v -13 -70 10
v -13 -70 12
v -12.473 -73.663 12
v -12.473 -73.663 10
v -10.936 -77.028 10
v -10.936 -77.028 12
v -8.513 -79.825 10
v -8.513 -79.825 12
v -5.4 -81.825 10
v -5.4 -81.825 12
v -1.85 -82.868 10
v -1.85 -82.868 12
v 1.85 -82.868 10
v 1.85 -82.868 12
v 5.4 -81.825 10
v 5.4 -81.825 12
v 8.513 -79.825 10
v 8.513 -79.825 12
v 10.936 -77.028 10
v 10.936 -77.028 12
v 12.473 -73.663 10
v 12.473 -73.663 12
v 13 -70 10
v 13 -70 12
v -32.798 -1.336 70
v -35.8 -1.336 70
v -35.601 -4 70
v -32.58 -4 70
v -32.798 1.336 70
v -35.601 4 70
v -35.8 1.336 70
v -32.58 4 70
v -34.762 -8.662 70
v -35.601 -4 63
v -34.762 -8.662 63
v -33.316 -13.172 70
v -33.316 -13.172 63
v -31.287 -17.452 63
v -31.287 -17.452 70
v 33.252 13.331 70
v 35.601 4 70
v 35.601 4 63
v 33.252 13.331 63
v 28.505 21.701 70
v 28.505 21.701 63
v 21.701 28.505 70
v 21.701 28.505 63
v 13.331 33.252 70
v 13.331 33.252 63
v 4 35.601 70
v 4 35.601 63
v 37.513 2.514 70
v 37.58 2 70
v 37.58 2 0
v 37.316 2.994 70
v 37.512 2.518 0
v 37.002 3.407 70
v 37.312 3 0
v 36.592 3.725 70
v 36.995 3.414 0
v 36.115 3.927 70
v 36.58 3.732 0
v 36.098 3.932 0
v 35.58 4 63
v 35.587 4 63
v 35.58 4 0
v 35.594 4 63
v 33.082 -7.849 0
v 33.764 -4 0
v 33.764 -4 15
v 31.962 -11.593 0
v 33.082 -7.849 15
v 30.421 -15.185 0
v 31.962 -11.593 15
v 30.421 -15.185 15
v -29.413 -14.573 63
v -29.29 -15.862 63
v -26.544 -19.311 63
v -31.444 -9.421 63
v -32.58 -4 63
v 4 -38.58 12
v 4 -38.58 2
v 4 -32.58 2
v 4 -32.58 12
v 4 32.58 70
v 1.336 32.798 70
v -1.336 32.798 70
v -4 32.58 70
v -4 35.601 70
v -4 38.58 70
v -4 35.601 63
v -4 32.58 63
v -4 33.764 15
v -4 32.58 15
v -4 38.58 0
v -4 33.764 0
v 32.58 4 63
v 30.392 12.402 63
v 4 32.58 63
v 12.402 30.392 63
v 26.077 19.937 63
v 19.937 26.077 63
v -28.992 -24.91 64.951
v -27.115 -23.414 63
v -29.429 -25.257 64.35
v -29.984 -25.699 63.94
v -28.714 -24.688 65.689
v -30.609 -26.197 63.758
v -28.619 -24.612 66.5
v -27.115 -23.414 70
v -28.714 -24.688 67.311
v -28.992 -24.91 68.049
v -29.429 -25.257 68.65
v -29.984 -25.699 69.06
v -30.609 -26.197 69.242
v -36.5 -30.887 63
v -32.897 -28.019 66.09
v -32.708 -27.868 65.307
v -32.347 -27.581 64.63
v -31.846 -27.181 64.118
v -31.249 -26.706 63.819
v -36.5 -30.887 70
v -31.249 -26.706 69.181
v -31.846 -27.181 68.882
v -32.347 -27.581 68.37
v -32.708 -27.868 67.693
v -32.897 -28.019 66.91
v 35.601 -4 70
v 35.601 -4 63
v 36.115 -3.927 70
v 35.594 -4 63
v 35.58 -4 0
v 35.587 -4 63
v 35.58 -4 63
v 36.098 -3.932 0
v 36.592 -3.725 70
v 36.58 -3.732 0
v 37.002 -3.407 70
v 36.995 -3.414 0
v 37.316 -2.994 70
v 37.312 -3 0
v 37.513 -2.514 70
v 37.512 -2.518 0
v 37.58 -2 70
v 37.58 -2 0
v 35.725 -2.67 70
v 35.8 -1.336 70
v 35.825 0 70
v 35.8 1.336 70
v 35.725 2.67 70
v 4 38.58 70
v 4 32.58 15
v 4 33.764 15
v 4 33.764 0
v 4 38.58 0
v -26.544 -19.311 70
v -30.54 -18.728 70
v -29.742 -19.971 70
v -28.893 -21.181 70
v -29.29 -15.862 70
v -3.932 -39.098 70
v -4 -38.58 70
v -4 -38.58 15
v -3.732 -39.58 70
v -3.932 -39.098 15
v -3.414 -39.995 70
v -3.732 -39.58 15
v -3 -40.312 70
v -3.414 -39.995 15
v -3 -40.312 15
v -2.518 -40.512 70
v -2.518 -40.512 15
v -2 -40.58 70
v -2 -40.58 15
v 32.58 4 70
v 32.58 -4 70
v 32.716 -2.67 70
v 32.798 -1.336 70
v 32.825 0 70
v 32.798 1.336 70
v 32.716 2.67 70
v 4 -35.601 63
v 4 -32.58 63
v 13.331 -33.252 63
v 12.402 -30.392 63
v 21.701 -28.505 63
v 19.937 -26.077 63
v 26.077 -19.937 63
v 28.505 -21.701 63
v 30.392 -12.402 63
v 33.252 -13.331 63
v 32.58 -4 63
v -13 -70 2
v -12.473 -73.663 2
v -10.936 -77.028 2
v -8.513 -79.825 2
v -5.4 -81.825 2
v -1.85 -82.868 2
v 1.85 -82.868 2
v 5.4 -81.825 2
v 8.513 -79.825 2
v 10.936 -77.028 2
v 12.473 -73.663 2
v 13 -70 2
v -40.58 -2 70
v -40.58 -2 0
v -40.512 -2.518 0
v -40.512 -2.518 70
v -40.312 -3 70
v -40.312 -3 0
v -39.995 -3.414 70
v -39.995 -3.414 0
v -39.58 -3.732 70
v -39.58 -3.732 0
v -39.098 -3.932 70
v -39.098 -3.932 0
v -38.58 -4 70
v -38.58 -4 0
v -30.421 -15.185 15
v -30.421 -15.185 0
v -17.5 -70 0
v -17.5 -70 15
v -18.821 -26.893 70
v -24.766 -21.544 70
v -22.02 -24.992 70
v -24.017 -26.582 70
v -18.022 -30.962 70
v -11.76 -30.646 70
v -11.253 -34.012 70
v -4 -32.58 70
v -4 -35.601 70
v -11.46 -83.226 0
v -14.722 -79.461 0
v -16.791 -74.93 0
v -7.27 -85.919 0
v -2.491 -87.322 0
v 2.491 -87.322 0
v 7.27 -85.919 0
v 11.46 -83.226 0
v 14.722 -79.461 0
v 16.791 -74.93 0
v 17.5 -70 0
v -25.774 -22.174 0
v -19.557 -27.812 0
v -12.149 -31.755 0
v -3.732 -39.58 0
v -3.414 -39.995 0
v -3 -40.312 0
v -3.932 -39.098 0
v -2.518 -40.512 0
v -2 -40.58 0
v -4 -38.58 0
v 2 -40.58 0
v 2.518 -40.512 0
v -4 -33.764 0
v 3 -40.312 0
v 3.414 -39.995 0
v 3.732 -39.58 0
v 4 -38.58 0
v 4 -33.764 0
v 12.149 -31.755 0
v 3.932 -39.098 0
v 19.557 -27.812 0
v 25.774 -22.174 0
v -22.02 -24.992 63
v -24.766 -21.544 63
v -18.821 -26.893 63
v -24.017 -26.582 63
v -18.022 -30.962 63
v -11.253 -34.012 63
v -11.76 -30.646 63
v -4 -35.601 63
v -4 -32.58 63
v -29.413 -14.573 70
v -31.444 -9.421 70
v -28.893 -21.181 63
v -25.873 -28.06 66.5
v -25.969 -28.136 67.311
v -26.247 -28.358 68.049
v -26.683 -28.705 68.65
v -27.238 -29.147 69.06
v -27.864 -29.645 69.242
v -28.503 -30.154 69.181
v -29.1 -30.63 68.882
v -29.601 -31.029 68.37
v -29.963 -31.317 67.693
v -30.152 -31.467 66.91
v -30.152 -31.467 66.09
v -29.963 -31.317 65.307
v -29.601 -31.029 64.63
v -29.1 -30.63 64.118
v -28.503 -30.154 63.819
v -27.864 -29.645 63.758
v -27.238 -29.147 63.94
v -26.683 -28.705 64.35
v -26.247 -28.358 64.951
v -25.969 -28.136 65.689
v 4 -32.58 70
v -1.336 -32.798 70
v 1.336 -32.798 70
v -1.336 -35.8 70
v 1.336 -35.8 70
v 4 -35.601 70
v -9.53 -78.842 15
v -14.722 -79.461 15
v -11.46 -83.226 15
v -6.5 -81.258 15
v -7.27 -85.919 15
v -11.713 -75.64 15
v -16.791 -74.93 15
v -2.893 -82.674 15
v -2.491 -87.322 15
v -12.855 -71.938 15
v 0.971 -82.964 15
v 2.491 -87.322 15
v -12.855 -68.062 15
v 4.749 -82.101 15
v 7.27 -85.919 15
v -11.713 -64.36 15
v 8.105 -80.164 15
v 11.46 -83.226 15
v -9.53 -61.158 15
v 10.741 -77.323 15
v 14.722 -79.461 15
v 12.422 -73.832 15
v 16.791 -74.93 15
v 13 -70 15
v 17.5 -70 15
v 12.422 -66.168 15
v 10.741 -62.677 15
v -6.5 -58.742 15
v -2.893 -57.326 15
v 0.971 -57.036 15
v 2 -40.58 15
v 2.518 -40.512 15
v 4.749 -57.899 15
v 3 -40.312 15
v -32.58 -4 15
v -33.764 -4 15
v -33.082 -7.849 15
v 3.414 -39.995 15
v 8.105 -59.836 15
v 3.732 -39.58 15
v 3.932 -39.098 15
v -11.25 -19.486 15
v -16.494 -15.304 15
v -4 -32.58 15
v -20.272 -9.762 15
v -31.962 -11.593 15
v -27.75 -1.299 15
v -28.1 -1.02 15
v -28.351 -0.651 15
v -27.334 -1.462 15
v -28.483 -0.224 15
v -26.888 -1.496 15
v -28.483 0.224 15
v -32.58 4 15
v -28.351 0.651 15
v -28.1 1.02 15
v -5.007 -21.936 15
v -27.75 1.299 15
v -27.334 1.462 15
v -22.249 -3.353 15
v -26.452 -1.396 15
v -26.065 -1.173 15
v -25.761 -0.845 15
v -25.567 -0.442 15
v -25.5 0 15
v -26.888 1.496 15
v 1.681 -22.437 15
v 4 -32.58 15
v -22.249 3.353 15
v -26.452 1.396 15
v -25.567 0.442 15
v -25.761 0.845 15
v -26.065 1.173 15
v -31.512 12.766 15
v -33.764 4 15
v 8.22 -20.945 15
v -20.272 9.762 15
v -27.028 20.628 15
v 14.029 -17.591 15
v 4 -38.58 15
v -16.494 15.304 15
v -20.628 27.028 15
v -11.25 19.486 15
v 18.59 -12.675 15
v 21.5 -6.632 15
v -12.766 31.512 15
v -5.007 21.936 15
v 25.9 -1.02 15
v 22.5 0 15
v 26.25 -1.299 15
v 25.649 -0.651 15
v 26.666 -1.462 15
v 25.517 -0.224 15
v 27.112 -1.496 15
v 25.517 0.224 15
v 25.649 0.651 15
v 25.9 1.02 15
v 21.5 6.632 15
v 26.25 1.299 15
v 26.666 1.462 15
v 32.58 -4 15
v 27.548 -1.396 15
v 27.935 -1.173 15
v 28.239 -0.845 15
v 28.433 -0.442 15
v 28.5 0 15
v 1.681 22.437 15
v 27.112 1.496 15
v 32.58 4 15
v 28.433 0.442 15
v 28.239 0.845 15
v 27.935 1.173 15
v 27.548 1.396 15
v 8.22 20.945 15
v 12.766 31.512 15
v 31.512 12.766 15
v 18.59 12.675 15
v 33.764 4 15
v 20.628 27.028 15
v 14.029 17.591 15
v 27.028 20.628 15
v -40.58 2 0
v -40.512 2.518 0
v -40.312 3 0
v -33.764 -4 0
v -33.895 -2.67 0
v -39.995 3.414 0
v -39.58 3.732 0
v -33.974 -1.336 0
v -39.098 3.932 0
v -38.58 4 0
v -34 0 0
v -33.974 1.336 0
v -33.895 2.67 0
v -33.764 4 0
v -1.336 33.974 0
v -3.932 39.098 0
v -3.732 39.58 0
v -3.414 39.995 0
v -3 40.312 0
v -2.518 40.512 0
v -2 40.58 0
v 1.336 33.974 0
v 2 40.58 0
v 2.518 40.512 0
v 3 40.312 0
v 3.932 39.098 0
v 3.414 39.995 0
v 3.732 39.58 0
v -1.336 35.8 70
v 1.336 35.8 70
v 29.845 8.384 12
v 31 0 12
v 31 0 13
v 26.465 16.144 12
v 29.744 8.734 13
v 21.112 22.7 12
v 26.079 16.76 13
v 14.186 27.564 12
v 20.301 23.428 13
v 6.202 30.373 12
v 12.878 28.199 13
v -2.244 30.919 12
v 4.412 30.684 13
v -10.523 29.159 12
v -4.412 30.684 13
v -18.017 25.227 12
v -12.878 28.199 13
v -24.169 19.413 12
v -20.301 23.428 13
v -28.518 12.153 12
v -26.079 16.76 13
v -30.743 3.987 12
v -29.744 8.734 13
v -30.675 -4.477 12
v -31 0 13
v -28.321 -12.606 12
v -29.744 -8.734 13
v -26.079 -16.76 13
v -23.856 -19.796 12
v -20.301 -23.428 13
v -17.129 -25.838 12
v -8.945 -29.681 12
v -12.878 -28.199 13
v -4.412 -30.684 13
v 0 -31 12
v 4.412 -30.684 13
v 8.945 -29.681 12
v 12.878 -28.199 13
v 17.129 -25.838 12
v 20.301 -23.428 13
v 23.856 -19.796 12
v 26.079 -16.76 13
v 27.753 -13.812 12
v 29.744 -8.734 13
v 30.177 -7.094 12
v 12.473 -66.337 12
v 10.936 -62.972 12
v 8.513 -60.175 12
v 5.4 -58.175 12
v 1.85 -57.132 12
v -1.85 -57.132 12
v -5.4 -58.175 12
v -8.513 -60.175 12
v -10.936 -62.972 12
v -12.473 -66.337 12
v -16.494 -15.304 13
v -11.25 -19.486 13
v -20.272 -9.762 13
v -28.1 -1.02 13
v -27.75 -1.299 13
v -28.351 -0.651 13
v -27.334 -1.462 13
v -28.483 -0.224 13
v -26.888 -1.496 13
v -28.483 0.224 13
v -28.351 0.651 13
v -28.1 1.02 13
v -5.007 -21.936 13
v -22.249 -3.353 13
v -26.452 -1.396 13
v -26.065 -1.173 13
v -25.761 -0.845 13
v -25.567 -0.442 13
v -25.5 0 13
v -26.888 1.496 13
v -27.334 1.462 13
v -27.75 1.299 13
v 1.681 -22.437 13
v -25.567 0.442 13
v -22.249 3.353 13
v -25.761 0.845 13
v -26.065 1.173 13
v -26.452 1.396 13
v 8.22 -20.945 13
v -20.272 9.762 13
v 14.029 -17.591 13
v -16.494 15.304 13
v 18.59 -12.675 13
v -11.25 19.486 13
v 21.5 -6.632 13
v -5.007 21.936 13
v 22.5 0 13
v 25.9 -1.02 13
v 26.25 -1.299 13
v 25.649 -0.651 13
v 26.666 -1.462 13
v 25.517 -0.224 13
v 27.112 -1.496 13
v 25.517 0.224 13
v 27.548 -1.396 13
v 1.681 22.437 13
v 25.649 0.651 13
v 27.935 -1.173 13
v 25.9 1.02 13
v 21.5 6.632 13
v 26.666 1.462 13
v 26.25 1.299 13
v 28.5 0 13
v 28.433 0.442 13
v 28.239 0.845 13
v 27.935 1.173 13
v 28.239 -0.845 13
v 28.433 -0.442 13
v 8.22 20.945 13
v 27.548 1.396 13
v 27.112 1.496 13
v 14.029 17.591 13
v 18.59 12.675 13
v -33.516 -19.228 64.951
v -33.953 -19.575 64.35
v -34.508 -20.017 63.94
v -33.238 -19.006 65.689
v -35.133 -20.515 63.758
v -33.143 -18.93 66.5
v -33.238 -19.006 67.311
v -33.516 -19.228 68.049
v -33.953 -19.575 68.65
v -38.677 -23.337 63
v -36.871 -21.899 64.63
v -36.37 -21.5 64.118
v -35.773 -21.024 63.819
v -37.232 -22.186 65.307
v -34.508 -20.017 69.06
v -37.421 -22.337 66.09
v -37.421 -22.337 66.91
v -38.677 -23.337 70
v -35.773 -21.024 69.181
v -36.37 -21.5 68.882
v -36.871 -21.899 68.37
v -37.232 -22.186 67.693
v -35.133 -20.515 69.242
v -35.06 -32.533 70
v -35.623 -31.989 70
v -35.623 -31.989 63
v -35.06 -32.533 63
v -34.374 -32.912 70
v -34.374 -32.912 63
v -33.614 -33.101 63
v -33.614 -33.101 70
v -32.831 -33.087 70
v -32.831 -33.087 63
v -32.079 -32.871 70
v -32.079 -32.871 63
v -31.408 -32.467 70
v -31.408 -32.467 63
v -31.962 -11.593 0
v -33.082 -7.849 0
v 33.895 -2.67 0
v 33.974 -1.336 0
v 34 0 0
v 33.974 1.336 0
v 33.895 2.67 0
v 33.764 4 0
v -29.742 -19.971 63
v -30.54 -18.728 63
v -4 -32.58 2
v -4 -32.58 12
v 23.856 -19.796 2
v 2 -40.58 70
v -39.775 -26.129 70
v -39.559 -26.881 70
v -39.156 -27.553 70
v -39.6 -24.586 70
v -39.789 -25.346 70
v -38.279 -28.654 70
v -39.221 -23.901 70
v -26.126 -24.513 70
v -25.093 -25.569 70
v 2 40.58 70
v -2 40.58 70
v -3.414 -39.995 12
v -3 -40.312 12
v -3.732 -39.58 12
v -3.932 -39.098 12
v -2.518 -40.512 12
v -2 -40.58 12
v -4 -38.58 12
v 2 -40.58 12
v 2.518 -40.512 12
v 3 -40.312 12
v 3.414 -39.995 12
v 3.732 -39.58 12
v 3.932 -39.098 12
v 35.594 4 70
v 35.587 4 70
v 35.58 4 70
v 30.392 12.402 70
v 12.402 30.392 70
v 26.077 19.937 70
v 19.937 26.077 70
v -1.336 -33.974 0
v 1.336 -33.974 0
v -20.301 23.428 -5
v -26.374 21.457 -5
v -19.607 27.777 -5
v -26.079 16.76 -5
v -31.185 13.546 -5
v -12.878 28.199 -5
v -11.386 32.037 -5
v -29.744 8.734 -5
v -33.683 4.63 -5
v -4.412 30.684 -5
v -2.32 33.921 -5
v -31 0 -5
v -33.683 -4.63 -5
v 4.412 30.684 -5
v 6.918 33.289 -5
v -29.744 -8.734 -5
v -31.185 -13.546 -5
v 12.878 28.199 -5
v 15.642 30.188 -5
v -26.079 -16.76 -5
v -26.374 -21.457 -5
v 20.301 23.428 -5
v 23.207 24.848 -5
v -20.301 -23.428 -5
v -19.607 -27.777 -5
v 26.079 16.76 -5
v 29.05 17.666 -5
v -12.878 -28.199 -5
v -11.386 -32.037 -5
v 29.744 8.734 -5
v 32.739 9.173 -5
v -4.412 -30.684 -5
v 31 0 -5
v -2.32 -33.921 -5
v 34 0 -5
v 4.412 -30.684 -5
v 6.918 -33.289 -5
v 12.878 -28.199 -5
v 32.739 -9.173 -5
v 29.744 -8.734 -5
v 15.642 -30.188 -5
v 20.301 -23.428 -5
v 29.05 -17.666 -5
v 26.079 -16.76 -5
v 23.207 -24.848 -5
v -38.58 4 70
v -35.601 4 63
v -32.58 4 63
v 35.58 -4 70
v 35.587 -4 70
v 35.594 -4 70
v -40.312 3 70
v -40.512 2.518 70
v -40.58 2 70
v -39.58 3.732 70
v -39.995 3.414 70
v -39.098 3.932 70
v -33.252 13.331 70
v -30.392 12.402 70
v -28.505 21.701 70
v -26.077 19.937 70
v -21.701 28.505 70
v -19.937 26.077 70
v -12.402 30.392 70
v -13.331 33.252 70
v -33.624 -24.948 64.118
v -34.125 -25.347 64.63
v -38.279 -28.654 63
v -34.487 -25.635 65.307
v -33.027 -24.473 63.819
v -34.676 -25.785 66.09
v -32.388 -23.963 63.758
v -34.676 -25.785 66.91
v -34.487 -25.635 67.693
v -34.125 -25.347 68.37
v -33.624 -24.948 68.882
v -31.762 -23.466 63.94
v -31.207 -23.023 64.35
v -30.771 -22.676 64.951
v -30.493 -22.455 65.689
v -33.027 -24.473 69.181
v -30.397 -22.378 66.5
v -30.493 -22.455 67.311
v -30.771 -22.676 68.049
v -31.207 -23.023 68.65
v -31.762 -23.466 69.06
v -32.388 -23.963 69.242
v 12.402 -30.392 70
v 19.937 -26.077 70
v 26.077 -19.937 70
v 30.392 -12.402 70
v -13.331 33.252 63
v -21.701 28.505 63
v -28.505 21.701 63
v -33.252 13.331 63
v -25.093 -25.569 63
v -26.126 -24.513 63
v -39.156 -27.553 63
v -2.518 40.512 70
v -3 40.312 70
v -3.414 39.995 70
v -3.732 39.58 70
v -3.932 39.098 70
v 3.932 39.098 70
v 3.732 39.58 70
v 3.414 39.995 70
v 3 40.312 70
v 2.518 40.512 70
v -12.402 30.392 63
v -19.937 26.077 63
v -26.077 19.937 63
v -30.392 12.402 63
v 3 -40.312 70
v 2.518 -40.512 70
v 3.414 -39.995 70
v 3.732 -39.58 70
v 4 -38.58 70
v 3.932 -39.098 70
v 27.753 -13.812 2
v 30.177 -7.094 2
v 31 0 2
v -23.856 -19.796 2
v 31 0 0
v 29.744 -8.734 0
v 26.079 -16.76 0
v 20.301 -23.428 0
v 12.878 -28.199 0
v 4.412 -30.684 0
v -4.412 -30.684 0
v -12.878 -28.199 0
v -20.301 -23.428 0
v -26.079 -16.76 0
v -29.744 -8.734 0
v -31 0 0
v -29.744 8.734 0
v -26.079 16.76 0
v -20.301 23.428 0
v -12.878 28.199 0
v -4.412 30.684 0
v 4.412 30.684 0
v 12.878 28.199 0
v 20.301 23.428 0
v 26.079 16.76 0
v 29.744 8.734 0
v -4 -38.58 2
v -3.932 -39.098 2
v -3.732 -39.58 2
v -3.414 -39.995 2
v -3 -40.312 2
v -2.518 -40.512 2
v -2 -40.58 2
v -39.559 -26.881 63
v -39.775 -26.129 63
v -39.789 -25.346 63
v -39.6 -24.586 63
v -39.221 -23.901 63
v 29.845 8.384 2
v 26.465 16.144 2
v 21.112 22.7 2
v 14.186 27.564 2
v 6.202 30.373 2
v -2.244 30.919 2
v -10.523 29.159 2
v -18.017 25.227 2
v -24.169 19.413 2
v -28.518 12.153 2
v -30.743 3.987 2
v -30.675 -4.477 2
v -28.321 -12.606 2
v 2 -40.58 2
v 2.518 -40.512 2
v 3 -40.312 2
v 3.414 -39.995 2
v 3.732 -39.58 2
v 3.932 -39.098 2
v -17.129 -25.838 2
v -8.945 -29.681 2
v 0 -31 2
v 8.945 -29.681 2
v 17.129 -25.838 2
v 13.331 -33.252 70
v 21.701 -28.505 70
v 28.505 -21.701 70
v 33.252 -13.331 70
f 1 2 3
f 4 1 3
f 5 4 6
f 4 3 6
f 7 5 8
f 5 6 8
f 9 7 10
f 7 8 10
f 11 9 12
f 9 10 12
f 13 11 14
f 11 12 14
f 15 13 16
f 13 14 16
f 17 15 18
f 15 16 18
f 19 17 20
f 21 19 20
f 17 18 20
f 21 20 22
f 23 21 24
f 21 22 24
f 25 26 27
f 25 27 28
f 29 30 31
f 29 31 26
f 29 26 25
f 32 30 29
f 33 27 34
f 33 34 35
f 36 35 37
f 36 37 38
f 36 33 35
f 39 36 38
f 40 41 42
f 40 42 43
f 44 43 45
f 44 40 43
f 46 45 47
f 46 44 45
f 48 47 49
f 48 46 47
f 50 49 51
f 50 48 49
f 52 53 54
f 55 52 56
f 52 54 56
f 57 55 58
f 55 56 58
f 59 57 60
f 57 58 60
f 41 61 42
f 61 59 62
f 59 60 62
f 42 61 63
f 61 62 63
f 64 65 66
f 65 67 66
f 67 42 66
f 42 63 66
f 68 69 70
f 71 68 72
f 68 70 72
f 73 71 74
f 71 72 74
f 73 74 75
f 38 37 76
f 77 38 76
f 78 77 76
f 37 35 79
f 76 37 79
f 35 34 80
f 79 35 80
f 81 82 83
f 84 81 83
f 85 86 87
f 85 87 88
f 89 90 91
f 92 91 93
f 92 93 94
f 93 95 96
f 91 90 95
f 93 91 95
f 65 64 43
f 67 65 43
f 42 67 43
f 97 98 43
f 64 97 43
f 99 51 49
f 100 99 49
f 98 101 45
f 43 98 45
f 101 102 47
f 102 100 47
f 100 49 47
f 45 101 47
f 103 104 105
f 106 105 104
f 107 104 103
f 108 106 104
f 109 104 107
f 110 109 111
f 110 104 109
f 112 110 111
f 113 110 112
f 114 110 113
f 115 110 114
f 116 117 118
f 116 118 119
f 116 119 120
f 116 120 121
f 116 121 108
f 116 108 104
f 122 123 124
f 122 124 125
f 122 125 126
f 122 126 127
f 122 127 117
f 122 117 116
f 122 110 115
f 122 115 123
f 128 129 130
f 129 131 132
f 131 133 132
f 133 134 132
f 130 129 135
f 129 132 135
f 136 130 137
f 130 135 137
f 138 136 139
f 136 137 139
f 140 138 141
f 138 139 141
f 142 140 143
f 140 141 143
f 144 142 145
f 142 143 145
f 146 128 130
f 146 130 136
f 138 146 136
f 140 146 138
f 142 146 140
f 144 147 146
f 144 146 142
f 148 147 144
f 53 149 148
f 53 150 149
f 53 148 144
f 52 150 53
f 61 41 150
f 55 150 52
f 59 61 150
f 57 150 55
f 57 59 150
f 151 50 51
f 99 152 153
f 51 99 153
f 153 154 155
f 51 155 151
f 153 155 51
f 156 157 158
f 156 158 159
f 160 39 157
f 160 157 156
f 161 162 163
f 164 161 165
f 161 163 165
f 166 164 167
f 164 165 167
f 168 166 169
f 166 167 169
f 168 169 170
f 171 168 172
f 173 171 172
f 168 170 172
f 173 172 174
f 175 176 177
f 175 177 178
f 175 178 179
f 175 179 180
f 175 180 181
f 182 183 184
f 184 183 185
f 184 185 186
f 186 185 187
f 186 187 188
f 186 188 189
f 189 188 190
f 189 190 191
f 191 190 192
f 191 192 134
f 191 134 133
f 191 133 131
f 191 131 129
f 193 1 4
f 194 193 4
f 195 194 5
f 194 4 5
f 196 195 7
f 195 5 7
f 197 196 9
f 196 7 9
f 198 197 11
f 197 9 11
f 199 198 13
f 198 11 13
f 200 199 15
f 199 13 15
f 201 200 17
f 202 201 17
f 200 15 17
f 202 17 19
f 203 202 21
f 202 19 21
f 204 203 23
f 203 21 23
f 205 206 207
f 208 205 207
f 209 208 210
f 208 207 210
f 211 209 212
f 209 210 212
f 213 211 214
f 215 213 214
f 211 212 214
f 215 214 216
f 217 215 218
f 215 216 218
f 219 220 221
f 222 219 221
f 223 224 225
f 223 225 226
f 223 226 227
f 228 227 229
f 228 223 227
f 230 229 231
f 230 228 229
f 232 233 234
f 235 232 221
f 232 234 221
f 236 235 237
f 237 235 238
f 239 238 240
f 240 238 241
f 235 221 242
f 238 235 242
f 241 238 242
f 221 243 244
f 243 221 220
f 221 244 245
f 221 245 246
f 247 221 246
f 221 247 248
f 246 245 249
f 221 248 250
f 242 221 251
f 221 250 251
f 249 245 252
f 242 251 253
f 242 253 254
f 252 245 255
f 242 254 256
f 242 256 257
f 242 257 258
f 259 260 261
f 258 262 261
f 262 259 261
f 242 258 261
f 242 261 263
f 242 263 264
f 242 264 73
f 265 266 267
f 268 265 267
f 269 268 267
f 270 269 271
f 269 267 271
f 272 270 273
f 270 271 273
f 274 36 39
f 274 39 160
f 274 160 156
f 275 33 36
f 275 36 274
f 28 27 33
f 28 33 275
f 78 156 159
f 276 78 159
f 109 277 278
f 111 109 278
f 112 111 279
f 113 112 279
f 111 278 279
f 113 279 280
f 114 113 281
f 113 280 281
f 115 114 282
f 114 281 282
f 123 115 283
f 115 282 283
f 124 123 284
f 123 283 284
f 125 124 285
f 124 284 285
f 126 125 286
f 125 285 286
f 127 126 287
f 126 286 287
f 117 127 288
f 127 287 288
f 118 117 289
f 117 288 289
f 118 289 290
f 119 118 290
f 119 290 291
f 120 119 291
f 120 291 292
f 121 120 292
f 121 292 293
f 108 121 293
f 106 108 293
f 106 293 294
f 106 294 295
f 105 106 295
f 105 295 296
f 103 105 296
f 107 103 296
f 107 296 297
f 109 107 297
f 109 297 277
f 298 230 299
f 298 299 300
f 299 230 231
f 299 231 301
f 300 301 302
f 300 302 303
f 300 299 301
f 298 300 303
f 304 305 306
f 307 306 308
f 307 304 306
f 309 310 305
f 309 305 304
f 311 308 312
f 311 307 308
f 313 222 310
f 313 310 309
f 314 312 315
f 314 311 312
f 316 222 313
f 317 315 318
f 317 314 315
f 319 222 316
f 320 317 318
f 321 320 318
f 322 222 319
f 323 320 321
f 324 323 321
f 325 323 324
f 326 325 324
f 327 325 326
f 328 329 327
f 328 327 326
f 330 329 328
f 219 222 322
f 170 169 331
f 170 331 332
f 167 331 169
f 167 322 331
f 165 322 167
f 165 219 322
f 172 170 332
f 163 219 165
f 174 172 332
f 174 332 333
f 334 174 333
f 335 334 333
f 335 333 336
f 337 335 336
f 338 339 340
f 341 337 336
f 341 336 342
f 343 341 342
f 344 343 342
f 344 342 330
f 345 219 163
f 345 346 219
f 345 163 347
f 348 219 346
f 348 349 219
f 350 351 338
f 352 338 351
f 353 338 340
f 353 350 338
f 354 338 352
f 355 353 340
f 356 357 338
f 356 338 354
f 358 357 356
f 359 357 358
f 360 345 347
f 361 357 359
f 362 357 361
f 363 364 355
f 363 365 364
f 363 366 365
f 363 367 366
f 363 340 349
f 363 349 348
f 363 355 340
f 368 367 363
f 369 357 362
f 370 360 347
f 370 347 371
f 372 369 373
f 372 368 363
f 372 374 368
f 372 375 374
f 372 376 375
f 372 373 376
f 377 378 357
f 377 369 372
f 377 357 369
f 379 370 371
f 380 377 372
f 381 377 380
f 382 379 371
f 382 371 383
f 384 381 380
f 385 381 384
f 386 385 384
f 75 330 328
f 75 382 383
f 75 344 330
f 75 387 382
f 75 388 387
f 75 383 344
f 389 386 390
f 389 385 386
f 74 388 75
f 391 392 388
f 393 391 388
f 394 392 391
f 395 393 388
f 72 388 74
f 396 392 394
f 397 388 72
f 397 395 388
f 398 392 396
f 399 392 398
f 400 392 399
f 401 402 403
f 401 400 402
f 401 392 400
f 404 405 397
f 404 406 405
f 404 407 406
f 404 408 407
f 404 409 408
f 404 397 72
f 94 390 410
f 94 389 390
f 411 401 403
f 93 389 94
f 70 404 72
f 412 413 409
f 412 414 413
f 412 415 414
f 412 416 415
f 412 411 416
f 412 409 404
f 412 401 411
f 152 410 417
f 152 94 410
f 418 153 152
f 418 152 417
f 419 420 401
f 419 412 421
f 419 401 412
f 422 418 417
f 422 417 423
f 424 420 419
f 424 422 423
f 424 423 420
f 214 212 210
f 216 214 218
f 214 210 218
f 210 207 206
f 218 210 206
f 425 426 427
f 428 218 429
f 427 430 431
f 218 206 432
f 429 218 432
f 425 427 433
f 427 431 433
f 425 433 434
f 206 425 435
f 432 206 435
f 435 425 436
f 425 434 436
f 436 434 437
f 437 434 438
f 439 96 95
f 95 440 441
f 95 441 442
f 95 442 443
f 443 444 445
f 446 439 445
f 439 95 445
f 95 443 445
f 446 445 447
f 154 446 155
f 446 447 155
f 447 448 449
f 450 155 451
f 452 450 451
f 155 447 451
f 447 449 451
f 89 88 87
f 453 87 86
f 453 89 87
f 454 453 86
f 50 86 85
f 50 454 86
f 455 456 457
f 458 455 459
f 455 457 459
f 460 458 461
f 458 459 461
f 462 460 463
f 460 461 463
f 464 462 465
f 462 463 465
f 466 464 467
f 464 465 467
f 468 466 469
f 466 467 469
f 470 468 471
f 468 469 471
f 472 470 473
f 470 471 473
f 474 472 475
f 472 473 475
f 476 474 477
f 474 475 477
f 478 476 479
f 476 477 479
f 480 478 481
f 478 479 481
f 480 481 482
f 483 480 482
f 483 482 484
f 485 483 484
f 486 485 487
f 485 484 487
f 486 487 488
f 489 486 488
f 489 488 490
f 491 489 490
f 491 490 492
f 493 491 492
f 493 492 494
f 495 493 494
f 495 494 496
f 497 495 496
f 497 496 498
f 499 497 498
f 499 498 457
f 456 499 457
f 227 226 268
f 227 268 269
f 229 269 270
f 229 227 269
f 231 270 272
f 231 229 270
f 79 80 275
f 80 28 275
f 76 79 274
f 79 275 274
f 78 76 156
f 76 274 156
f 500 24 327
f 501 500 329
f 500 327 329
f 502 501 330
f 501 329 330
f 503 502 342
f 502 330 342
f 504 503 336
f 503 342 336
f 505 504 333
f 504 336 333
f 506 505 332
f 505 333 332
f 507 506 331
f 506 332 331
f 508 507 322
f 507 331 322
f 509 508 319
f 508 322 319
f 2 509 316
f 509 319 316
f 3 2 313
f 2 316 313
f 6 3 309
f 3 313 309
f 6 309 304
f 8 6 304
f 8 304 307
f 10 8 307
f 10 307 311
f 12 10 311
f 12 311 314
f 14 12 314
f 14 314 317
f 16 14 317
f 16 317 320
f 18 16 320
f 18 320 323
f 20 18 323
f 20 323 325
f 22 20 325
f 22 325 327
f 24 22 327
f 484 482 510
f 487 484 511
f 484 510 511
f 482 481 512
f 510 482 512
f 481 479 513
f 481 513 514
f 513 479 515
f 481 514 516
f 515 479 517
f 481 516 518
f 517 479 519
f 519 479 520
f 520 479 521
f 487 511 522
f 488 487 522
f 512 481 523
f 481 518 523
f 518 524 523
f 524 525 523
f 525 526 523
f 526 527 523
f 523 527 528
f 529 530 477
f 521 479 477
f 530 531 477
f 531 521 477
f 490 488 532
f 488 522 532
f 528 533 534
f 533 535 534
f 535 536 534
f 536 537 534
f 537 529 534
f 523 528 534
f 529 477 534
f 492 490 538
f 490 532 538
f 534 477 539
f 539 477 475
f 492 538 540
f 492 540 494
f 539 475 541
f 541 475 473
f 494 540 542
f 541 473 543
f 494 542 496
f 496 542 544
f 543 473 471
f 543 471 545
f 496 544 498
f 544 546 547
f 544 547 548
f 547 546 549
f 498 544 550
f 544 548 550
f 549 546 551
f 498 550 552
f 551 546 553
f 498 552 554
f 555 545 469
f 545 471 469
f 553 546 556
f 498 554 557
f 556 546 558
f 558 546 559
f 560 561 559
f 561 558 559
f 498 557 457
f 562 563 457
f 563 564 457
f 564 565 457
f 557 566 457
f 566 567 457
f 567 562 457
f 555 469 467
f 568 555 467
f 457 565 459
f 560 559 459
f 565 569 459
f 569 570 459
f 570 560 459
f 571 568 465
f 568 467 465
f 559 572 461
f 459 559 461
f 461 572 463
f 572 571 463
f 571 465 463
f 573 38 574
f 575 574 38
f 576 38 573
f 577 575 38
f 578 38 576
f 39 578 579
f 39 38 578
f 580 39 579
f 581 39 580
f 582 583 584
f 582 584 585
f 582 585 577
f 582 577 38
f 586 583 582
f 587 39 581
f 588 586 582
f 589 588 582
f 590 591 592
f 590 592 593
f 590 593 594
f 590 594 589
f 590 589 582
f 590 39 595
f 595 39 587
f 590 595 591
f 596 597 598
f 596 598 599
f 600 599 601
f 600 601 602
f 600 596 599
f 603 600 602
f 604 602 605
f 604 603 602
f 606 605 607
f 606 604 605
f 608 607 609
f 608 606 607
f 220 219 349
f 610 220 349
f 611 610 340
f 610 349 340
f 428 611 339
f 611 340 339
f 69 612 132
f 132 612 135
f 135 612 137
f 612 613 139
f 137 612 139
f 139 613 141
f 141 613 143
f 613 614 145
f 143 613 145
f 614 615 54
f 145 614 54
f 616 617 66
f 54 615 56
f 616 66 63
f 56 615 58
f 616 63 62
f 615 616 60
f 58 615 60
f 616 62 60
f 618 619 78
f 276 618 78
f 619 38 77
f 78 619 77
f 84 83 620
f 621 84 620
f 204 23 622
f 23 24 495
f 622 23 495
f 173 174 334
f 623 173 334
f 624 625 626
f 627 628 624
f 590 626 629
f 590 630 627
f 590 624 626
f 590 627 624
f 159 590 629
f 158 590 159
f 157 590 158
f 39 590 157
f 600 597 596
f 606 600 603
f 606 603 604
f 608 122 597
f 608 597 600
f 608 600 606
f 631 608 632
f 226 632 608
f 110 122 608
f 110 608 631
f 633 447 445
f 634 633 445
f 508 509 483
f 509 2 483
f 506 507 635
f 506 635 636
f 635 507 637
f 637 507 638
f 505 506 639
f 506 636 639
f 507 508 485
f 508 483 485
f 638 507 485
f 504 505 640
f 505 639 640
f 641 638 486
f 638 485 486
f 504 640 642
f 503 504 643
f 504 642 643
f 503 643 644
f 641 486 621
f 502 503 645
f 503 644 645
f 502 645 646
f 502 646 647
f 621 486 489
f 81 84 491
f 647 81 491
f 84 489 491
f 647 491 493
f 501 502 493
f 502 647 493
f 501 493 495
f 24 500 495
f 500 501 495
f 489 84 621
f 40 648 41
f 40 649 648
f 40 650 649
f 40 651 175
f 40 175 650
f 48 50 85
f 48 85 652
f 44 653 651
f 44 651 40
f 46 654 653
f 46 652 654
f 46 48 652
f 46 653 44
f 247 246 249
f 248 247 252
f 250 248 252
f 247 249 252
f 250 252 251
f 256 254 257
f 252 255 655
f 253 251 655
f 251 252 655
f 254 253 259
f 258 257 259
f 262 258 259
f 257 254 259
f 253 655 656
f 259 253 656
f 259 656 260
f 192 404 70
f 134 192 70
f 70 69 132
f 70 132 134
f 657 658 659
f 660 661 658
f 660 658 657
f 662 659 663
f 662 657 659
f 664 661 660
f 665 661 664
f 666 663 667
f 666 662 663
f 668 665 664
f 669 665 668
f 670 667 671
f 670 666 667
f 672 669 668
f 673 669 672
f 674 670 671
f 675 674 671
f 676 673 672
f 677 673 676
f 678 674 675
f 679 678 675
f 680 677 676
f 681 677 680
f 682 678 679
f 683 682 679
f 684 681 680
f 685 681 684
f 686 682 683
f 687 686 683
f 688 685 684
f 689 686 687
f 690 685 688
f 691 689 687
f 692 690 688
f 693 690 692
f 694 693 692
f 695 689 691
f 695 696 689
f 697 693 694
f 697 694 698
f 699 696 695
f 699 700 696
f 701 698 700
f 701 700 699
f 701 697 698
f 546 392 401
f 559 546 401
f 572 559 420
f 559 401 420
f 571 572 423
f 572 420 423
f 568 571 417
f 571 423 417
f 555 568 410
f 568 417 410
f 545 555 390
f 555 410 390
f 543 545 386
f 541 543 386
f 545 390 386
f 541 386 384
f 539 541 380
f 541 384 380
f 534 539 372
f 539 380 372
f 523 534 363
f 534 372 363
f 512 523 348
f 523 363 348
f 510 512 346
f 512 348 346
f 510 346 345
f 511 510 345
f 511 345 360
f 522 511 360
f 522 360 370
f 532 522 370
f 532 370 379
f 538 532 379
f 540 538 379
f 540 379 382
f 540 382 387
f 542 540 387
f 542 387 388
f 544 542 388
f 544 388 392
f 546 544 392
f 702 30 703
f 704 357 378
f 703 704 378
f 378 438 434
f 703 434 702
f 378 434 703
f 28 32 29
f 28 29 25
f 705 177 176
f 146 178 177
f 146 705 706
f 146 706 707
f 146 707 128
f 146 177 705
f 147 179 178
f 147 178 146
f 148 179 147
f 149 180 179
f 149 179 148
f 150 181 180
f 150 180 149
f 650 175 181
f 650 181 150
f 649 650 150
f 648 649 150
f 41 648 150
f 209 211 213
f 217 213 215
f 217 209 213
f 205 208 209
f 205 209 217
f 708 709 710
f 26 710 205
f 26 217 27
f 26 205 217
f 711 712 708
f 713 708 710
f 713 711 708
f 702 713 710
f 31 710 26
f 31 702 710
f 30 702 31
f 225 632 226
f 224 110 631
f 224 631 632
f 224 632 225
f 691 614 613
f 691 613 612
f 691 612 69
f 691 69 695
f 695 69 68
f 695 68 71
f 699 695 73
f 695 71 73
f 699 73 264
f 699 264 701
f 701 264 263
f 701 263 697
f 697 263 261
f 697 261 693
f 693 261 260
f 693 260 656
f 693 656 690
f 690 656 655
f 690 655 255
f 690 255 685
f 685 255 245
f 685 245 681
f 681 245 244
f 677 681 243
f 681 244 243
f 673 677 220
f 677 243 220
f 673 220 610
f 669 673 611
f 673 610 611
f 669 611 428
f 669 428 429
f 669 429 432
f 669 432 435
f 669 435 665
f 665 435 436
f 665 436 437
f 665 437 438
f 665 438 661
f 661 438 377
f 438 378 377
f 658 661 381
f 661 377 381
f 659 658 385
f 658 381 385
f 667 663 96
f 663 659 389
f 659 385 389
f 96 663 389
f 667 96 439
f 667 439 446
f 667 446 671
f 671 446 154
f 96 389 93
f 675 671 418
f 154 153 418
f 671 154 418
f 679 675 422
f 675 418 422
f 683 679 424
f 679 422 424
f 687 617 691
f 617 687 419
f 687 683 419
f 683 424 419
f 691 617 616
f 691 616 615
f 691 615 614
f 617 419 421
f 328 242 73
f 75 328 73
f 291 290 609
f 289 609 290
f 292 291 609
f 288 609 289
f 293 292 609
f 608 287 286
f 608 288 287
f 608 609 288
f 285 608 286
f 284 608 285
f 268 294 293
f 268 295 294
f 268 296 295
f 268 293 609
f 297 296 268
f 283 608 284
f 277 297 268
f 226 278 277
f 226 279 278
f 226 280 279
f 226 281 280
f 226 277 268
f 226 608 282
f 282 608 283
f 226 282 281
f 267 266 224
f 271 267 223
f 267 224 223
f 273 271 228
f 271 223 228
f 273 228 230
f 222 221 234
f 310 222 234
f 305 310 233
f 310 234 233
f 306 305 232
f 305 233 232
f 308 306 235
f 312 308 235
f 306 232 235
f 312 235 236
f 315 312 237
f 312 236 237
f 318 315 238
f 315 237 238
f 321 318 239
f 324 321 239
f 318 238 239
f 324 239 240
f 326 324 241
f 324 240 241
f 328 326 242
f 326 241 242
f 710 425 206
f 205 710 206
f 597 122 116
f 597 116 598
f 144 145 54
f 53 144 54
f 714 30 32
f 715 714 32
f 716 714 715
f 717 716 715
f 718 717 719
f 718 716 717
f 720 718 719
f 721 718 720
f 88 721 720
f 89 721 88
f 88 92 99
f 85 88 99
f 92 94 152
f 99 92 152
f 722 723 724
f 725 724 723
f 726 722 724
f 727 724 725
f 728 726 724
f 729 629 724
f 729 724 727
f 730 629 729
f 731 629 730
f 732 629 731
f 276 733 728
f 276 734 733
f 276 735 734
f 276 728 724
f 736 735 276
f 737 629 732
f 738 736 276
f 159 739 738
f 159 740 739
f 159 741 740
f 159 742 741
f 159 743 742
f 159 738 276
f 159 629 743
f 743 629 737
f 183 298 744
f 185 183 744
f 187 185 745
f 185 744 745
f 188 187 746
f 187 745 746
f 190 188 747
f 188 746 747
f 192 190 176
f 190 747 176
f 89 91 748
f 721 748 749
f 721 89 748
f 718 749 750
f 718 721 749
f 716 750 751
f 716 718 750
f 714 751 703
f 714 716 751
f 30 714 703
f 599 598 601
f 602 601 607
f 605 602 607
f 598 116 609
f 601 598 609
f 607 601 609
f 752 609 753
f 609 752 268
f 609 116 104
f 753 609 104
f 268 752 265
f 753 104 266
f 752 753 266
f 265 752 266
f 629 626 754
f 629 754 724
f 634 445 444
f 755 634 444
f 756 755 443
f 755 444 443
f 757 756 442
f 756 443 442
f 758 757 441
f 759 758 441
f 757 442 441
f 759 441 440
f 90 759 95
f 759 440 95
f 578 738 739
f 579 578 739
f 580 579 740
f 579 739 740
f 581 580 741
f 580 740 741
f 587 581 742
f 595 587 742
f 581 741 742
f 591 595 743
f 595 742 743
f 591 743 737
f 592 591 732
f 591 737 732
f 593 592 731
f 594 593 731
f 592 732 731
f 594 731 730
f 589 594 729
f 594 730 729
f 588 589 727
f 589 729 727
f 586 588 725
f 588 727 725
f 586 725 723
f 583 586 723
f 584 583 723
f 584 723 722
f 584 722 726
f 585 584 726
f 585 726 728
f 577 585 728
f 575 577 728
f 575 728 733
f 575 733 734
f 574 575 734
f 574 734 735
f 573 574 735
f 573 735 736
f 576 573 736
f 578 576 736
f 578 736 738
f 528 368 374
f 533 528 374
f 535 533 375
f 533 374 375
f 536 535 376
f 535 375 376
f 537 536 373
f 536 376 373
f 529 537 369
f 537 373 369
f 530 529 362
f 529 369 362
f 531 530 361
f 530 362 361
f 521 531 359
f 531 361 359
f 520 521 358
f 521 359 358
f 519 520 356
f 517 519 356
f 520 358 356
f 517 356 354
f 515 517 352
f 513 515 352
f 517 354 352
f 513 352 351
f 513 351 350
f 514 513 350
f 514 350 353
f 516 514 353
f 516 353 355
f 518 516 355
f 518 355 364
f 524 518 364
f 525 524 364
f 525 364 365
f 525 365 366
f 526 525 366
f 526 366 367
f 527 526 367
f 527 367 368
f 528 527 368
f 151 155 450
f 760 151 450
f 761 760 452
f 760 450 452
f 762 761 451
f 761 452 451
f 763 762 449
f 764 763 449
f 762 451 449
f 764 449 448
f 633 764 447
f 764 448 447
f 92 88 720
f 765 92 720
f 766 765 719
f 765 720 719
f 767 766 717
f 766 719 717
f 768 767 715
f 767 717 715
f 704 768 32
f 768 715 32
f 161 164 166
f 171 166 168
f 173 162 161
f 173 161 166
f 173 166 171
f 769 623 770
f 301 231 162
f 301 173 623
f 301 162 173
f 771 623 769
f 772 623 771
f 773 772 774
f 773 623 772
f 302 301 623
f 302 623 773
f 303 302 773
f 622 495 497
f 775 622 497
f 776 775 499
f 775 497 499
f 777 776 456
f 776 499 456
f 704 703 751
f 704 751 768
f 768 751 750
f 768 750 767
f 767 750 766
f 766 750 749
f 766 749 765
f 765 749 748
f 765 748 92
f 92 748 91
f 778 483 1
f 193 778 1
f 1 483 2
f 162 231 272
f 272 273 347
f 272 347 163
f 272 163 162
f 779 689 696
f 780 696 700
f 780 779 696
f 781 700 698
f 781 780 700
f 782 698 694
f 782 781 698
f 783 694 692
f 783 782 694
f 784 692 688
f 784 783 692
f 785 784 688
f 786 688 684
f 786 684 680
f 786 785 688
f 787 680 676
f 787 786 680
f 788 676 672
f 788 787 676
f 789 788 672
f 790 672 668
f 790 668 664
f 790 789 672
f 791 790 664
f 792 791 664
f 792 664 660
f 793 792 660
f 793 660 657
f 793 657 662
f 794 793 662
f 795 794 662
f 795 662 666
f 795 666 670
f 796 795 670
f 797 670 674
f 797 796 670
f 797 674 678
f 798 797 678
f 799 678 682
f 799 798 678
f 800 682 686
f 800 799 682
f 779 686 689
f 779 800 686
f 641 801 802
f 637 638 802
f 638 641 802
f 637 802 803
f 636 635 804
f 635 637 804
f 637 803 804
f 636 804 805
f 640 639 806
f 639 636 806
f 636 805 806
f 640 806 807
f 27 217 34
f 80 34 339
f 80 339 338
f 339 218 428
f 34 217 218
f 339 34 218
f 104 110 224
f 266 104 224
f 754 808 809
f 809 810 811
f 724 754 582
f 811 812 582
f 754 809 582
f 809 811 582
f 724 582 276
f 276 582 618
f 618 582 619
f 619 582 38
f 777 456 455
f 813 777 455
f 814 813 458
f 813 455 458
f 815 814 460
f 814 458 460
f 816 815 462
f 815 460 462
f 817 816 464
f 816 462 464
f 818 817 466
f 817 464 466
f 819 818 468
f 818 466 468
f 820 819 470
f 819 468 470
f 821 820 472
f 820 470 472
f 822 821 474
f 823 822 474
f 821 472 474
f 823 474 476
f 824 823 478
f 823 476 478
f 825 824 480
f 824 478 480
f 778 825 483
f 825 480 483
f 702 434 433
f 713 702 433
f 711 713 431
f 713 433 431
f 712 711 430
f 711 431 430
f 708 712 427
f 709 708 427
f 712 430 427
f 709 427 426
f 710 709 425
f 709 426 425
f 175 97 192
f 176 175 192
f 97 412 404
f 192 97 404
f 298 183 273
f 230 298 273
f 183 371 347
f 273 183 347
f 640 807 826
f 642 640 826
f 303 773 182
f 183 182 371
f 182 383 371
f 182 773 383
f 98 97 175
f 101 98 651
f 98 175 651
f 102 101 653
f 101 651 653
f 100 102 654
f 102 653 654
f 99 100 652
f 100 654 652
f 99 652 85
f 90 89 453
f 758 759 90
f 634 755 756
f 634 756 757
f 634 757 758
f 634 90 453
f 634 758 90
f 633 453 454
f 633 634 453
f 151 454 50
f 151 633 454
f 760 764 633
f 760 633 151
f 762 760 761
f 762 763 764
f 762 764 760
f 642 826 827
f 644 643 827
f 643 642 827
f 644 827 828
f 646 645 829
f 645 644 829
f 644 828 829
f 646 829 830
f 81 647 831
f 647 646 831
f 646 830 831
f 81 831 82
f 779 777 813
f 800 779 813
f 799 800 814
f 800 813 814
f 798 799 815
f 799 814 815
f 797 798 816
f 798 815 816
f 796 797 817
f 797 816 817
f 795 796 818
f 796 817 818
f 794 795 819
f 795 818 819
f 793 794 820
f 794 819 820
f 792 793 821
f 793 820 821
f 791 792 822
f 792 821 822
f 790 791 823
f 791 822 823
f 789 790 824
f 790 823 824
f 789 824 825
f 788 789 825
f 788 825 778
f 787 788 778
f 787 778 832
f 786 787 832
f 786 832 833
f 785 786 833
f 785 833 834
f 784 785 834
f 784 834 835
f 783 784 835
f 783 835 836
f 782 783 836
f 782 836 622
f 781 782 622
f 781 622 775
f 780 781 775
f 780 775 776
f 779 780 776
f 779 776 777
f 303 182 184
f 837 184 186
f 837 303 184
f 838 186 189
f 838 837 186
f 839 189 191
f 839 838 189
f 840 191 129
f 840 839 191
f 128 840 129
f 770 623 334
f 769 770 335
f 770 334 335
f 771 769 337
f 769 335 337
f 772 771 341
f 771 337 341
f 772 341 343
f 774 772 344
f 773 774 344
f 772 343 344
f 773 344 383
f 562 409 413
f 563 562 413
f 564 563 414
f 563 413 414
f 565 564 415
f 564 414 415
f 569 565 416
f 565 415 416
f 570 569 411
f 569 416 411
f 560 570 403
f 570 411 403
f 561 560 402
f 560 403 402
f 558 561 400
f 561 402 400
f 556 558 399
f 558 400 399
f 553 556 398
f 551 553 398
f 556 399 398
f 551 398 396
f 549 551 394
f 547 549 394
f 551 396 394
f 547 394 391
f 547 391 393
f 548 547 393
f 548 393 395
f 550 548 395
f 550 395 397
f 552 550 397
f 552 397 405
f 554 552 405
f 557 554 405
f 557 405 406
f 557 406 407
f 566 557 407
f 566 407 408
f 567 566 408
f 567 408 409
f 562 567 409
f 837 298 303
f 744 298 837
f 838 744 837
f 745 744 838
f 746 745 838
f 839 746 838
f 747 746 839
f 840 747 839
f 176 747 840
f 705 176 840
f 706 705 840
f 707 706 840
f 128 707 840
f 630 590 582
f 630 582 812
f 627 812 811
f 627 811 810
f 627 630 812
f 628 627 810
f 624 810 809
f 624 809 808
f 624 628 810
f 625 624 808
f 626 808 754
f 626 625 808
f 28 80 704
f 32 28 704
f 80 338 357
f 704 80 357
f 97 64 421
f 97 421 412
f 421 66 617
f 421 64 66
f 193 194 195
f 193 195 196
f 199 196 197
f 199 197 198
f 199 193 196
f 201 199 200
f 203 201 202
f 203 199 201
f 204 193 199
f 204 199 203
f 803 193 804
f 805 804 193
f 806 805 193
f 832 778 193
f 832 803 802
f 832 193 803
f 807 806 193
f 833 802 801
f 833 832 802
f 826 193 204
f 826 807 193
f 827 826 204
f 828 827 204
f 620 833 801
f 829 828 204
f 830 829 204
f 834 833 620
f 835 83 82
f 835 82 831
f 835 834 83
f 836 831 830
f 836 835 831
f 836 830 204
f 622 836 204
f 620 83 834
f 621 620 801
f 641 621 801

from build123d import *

# Parameters (mm, degrees)
F1_DEPTH  = 15
F3_START  = -2
F2_R      = 31
F3_DEPTH  = 19.9
F5_START  = -3
F5_DEPTH  = 10
F6_R      = 22.5
F6_R_2    = 13
F7_DEPTH  = 5
F10_R     = 34
F10_R_2   = 31
F11_DEPTH = 5
F12_R     = 1.5
F13_DEPTH = 5
F15_DEPTH = 70
F16_R     = 35.825
F16_R_2   = 32.825
F17_DEPTH = 7
F19_DEPTH = 9.7
F21_DEPTH = 7
F22_R     = 2.75
F23_DEPTH = 14.84


# Not quite as in the source:
# - the program builds the solid bodies; features that only make, move or delete a surface that nothing else refers to are left out


with BuildPart() as f1:
    # F0 (on Top) → F1 (new body)
    with BuildSketch(Plane.XY):
        with BuildLine():
            Line((30.4207066557, -15.1848808546), (34, 0))
            ThreePointArc((34, 0), (0, 34), (-34, 0))
            Line((-34, 0), (-30.4207066557, -15.1848808546))
            ThreePointArc((-30.4207066557, -15.1848808546), (0, -34), (30.4207066557, -15.1848808546))
        make_face()
        with BuildLine():
            ThreePointArc((30.4207066557, -15.1848808546), (33.0930810465, -7.8005119609), (34, 0))
            Line((34, 0), (30.4207066557, -15.1848808546))
        make_face()
        with BuildLine():
            Line((-30.4207066557, -15.1848808546), (-34, 0))
            ThreePointArc((-34, 0), (-33.0930810465, -7.8005119609), (-30.4207066557, -15.1848808546))
        make_face()
        with BuildLine():
            Line((17.5, -70), (30.4207066557, -15.1848808546))
            ThreePointArc((30.4207066557, -15.1848808546), (0, -34), (-30.4207066557, -15.1848808546))
            Line((-30.4207066557, -15.1848808546), (-17.5, -70))
            ThreePointArc((-17.5, -70), (0, -52.5), (17.5, -70))
        make_face()
        with BuildLine():
            ThreePointArc((-17.5, -70), (0, -87.5), (17.5, -70))
            ThreePointArc((17.5, -70), (0, -52.5), (-17.5, -70))
        make_face()
    extrude(amount=F1_DEPTH)

    # F2 (on face) → F3 (cut)
    with BuildSketch(Plane.XY.offset(15).offset(F3_START)):
        Circle(F2_R)
    extrude(amount=-F3_DEPTH, mode=Mode.SUBTRACT)

    # F4 (on face) → F5 (cut)
    with BuildSketch(Plane.XY.offset(15).offset(F5_START)):
        with BuildLine():
            ThreePointArc((-13, -70), (0, -83), (13, -70))
            ThreePointArc((13, -70), (0, -57), (-13, -70))
        make_face()
        with BuildLine():
            ThreePointArc((-13, -70), (0, -57), (13, -70))
            Line((13, -70), (23.8560199829, -19.7962196031))
            ThreePointArc((23.8560199829, -19.7962196031), (0, -31), (-23.8560199829, -19.7962196031))
            Line((-23.8560199829, -19.7962196031), (-13, -70))
        make_face()
        with BuildLine():
            ThreePointArc((-23.8560199829, -19.7962196031), (0, -31), (23.8560199829, -19.7962196031))
            ThreePointArc((23.8560199829, -19.7962196031), (29.1593605852, -10.5229126322), (31, 0))
            ThreePointArc((31, 0), (-10.5229126322, 29.1593605852), (-23.8560199829, -19.7962196031))
        make_face()
    extrude(amount=-F5_DEPTH, mode=Mode.SUBTRACT)

    # F6 (on face) → F7 (cut)
    with BuildSketch(Plane.XY.offset(15)):
        Circle(F6_R)
        with Locations((0, -70)):
            Circle(F6_R_2)
    extrude(amount=-F7_DEPTH, mode=Mode.SUBTRACT)

    # F10 (on face) → F11 (join)
    with BuildSketch(Plane(origin=(0, 0, 0), x_dir=(1, 0, 0), z_dir=(0, 0, -1))):
        Circle(F10_R)
        Circle(F10_R_2, mode=Mode.SUBTRACT)
    extrude(amount=F11_DEPTH)

    # F12 (on face) → F13 (cut)
    with BuildSketch(Plane.XY.offset(15)):
        with Locations((-27, 0)):
            Circle(F12_R)
        with Locations((27, 0)):
            Circle(F12_R)
    extrude(amount=-F13_DEPTH, mode=Mode.SUBTRACT)

    # F14 (on Top) → F15 (join)
    with BuildSketch(Plane.XY):
        with BuildLine():
            ThreePointArc((-40.580371775, -2), (-39.9945853374, -3.4142135624), (-38.580371775, -4))
            Line((-38.580371775, -4), (-32.580371775, -4))
            Line((-32.580371775, -4), (-32.580371775, 4))
            Line((-32.580371775, 4), (-38.580371775, 4))
            ThreePointArc((-38.580371775, 4), (-39.9945853374, 3.4142135624), (-40.580371775, 2))
            Line((-40.580371775, 2), (-40.580371775, -2))
        make_face()
        with BuildLine():
            Line((-4, 38.580371775), (-4, 32.580371775))
            Line((-4, 32.580371775), (4, 32.580371775))
            Line((4, 32.580371775), (4, 38.580371775))
            ThreePointArc((4, 38.580371775), (3.4142135624, 39.9945853374), (2, 40.580371775))
            Line((2, 40.580371775), (-2, 40.580371775))
            ThreePointArc((-2, 40.580371775), (-3.4142135624, 39.9945853374), (-4, 38.580371775))
        make_face()
        with BuildLine():
            Line((32.580371775, 4), (32.580371775, -4))
            Line((32.580371775, -4), (35.580371775, -4))
            ThreePointArc((35.580371775, -4), (36.9945853374, -3.4142135624), (37.580371775, -2))
            Line((37.580371775, -2), (37.580371775, 2))
            ThreePointArc((37.580371775, 2), (36.9945853374, 3.4142135624), (35.580371775, 4))
            Line((35.580371775, 4), (32.580371775, 4))
        make_face()
        with BuildLine():
            Line((4, -32.580371775), (-4, -32.580371775))
            Line((-4, -32.580371775), (-4, -38.580371775))
            ThreePointArc((-4, -38.580371775), (-3.4142135624, -39.9945853374), (-2, -40.580371775))
            Line((-2, -40.580371775), (2, -40.580371775))
            ThreePointArc((2, -40.580371775), (3.4142135624, -39.9945853374), (4, -38.580371775))
            Line((4, -38.580371775), (4, -32.580371775))
        make_face()
    extrude(amount=F15_DEPTH)

    # F16 (on face) → F17 (join)
    with BuildSketch(Plane.XY.offset(70)):
        Circle(F16_R)
        Circle(F16_R_2, mode=Mode.SUBTRACT)
    extrude(amount=-F17_DEPTH)

    # F18 (on face) → F19 (cut)
    with BuildSketch(Plane.XY.offset(70)):
        Polygon((-23.3274125101, -16.7493631263), (-31.6316734562, -23.3615097559), (-29.853291891, -25.5949969131), (-21.5490309449, -18.9828502835), align=None)
    extrude(amount=-F19_DEPTH, mode=Mode.SUBTRACT)

    # F20 (on face) → F21 (join)
    with BuildSketch(Plane.XY.offset(70)):
        with BuildLine():
            Line((-38.2785545197, -28.6539918331), (-26.5440042016, -19.3105273347))
            Line((-26.5440042016, -19.3105273347), (-29.2896663374, -15.8622228547))
            Line((-29.2896663374, -15.8622228547), (-38.6773065919, -23.3369944533))
            ThreePointArc((-38.6773065919, -23.3369944533), (-39.7894951343, -25.3457539175), (-39.1555237558, -27.5525974166))
            Line((-39.1555237558, -27.5525974166), (-38.2785545197, -28.6539918331))
        make_face()
        with BuildLine():
            Line((-22.0199605007, -24.9923189719), (-24.7656226365, -21.5440144919))
            Line((-24.7656226365, -21.5440144919), (-36.5001729546, -30.8874789902))
            Line((-36.5001729546, -30.8874789902), (-35.6232037185, -31.9888734067))
            ThreePointArc((-35.6232037185, -31.9888734067), (-33.6144442544, -33.1010619491), (-31.4076007552, -32.4670905706))
            Line((-31.4076007552, -32.4670905706), (-22.0199605007, -24.9923189719))
        make_face()
    extrude(amount=-F21_DEPTH)

    # F22 (on face) → F23 (cut)
    with BuildSketch(Plane(origin=(3.6348529183, -4.5650480586, 0), x_dir=(0.7823033545, 0.6228976332, 0), z_dir=(0.6228976332, -0.7823033545, 0))):
        with Locations((-40.469146122, 66.5)):
            Circle(F22_R)
    extrude(amount=-F23_DEPTH, mode=Mode.SUBTRACT)


solid = f1.part
